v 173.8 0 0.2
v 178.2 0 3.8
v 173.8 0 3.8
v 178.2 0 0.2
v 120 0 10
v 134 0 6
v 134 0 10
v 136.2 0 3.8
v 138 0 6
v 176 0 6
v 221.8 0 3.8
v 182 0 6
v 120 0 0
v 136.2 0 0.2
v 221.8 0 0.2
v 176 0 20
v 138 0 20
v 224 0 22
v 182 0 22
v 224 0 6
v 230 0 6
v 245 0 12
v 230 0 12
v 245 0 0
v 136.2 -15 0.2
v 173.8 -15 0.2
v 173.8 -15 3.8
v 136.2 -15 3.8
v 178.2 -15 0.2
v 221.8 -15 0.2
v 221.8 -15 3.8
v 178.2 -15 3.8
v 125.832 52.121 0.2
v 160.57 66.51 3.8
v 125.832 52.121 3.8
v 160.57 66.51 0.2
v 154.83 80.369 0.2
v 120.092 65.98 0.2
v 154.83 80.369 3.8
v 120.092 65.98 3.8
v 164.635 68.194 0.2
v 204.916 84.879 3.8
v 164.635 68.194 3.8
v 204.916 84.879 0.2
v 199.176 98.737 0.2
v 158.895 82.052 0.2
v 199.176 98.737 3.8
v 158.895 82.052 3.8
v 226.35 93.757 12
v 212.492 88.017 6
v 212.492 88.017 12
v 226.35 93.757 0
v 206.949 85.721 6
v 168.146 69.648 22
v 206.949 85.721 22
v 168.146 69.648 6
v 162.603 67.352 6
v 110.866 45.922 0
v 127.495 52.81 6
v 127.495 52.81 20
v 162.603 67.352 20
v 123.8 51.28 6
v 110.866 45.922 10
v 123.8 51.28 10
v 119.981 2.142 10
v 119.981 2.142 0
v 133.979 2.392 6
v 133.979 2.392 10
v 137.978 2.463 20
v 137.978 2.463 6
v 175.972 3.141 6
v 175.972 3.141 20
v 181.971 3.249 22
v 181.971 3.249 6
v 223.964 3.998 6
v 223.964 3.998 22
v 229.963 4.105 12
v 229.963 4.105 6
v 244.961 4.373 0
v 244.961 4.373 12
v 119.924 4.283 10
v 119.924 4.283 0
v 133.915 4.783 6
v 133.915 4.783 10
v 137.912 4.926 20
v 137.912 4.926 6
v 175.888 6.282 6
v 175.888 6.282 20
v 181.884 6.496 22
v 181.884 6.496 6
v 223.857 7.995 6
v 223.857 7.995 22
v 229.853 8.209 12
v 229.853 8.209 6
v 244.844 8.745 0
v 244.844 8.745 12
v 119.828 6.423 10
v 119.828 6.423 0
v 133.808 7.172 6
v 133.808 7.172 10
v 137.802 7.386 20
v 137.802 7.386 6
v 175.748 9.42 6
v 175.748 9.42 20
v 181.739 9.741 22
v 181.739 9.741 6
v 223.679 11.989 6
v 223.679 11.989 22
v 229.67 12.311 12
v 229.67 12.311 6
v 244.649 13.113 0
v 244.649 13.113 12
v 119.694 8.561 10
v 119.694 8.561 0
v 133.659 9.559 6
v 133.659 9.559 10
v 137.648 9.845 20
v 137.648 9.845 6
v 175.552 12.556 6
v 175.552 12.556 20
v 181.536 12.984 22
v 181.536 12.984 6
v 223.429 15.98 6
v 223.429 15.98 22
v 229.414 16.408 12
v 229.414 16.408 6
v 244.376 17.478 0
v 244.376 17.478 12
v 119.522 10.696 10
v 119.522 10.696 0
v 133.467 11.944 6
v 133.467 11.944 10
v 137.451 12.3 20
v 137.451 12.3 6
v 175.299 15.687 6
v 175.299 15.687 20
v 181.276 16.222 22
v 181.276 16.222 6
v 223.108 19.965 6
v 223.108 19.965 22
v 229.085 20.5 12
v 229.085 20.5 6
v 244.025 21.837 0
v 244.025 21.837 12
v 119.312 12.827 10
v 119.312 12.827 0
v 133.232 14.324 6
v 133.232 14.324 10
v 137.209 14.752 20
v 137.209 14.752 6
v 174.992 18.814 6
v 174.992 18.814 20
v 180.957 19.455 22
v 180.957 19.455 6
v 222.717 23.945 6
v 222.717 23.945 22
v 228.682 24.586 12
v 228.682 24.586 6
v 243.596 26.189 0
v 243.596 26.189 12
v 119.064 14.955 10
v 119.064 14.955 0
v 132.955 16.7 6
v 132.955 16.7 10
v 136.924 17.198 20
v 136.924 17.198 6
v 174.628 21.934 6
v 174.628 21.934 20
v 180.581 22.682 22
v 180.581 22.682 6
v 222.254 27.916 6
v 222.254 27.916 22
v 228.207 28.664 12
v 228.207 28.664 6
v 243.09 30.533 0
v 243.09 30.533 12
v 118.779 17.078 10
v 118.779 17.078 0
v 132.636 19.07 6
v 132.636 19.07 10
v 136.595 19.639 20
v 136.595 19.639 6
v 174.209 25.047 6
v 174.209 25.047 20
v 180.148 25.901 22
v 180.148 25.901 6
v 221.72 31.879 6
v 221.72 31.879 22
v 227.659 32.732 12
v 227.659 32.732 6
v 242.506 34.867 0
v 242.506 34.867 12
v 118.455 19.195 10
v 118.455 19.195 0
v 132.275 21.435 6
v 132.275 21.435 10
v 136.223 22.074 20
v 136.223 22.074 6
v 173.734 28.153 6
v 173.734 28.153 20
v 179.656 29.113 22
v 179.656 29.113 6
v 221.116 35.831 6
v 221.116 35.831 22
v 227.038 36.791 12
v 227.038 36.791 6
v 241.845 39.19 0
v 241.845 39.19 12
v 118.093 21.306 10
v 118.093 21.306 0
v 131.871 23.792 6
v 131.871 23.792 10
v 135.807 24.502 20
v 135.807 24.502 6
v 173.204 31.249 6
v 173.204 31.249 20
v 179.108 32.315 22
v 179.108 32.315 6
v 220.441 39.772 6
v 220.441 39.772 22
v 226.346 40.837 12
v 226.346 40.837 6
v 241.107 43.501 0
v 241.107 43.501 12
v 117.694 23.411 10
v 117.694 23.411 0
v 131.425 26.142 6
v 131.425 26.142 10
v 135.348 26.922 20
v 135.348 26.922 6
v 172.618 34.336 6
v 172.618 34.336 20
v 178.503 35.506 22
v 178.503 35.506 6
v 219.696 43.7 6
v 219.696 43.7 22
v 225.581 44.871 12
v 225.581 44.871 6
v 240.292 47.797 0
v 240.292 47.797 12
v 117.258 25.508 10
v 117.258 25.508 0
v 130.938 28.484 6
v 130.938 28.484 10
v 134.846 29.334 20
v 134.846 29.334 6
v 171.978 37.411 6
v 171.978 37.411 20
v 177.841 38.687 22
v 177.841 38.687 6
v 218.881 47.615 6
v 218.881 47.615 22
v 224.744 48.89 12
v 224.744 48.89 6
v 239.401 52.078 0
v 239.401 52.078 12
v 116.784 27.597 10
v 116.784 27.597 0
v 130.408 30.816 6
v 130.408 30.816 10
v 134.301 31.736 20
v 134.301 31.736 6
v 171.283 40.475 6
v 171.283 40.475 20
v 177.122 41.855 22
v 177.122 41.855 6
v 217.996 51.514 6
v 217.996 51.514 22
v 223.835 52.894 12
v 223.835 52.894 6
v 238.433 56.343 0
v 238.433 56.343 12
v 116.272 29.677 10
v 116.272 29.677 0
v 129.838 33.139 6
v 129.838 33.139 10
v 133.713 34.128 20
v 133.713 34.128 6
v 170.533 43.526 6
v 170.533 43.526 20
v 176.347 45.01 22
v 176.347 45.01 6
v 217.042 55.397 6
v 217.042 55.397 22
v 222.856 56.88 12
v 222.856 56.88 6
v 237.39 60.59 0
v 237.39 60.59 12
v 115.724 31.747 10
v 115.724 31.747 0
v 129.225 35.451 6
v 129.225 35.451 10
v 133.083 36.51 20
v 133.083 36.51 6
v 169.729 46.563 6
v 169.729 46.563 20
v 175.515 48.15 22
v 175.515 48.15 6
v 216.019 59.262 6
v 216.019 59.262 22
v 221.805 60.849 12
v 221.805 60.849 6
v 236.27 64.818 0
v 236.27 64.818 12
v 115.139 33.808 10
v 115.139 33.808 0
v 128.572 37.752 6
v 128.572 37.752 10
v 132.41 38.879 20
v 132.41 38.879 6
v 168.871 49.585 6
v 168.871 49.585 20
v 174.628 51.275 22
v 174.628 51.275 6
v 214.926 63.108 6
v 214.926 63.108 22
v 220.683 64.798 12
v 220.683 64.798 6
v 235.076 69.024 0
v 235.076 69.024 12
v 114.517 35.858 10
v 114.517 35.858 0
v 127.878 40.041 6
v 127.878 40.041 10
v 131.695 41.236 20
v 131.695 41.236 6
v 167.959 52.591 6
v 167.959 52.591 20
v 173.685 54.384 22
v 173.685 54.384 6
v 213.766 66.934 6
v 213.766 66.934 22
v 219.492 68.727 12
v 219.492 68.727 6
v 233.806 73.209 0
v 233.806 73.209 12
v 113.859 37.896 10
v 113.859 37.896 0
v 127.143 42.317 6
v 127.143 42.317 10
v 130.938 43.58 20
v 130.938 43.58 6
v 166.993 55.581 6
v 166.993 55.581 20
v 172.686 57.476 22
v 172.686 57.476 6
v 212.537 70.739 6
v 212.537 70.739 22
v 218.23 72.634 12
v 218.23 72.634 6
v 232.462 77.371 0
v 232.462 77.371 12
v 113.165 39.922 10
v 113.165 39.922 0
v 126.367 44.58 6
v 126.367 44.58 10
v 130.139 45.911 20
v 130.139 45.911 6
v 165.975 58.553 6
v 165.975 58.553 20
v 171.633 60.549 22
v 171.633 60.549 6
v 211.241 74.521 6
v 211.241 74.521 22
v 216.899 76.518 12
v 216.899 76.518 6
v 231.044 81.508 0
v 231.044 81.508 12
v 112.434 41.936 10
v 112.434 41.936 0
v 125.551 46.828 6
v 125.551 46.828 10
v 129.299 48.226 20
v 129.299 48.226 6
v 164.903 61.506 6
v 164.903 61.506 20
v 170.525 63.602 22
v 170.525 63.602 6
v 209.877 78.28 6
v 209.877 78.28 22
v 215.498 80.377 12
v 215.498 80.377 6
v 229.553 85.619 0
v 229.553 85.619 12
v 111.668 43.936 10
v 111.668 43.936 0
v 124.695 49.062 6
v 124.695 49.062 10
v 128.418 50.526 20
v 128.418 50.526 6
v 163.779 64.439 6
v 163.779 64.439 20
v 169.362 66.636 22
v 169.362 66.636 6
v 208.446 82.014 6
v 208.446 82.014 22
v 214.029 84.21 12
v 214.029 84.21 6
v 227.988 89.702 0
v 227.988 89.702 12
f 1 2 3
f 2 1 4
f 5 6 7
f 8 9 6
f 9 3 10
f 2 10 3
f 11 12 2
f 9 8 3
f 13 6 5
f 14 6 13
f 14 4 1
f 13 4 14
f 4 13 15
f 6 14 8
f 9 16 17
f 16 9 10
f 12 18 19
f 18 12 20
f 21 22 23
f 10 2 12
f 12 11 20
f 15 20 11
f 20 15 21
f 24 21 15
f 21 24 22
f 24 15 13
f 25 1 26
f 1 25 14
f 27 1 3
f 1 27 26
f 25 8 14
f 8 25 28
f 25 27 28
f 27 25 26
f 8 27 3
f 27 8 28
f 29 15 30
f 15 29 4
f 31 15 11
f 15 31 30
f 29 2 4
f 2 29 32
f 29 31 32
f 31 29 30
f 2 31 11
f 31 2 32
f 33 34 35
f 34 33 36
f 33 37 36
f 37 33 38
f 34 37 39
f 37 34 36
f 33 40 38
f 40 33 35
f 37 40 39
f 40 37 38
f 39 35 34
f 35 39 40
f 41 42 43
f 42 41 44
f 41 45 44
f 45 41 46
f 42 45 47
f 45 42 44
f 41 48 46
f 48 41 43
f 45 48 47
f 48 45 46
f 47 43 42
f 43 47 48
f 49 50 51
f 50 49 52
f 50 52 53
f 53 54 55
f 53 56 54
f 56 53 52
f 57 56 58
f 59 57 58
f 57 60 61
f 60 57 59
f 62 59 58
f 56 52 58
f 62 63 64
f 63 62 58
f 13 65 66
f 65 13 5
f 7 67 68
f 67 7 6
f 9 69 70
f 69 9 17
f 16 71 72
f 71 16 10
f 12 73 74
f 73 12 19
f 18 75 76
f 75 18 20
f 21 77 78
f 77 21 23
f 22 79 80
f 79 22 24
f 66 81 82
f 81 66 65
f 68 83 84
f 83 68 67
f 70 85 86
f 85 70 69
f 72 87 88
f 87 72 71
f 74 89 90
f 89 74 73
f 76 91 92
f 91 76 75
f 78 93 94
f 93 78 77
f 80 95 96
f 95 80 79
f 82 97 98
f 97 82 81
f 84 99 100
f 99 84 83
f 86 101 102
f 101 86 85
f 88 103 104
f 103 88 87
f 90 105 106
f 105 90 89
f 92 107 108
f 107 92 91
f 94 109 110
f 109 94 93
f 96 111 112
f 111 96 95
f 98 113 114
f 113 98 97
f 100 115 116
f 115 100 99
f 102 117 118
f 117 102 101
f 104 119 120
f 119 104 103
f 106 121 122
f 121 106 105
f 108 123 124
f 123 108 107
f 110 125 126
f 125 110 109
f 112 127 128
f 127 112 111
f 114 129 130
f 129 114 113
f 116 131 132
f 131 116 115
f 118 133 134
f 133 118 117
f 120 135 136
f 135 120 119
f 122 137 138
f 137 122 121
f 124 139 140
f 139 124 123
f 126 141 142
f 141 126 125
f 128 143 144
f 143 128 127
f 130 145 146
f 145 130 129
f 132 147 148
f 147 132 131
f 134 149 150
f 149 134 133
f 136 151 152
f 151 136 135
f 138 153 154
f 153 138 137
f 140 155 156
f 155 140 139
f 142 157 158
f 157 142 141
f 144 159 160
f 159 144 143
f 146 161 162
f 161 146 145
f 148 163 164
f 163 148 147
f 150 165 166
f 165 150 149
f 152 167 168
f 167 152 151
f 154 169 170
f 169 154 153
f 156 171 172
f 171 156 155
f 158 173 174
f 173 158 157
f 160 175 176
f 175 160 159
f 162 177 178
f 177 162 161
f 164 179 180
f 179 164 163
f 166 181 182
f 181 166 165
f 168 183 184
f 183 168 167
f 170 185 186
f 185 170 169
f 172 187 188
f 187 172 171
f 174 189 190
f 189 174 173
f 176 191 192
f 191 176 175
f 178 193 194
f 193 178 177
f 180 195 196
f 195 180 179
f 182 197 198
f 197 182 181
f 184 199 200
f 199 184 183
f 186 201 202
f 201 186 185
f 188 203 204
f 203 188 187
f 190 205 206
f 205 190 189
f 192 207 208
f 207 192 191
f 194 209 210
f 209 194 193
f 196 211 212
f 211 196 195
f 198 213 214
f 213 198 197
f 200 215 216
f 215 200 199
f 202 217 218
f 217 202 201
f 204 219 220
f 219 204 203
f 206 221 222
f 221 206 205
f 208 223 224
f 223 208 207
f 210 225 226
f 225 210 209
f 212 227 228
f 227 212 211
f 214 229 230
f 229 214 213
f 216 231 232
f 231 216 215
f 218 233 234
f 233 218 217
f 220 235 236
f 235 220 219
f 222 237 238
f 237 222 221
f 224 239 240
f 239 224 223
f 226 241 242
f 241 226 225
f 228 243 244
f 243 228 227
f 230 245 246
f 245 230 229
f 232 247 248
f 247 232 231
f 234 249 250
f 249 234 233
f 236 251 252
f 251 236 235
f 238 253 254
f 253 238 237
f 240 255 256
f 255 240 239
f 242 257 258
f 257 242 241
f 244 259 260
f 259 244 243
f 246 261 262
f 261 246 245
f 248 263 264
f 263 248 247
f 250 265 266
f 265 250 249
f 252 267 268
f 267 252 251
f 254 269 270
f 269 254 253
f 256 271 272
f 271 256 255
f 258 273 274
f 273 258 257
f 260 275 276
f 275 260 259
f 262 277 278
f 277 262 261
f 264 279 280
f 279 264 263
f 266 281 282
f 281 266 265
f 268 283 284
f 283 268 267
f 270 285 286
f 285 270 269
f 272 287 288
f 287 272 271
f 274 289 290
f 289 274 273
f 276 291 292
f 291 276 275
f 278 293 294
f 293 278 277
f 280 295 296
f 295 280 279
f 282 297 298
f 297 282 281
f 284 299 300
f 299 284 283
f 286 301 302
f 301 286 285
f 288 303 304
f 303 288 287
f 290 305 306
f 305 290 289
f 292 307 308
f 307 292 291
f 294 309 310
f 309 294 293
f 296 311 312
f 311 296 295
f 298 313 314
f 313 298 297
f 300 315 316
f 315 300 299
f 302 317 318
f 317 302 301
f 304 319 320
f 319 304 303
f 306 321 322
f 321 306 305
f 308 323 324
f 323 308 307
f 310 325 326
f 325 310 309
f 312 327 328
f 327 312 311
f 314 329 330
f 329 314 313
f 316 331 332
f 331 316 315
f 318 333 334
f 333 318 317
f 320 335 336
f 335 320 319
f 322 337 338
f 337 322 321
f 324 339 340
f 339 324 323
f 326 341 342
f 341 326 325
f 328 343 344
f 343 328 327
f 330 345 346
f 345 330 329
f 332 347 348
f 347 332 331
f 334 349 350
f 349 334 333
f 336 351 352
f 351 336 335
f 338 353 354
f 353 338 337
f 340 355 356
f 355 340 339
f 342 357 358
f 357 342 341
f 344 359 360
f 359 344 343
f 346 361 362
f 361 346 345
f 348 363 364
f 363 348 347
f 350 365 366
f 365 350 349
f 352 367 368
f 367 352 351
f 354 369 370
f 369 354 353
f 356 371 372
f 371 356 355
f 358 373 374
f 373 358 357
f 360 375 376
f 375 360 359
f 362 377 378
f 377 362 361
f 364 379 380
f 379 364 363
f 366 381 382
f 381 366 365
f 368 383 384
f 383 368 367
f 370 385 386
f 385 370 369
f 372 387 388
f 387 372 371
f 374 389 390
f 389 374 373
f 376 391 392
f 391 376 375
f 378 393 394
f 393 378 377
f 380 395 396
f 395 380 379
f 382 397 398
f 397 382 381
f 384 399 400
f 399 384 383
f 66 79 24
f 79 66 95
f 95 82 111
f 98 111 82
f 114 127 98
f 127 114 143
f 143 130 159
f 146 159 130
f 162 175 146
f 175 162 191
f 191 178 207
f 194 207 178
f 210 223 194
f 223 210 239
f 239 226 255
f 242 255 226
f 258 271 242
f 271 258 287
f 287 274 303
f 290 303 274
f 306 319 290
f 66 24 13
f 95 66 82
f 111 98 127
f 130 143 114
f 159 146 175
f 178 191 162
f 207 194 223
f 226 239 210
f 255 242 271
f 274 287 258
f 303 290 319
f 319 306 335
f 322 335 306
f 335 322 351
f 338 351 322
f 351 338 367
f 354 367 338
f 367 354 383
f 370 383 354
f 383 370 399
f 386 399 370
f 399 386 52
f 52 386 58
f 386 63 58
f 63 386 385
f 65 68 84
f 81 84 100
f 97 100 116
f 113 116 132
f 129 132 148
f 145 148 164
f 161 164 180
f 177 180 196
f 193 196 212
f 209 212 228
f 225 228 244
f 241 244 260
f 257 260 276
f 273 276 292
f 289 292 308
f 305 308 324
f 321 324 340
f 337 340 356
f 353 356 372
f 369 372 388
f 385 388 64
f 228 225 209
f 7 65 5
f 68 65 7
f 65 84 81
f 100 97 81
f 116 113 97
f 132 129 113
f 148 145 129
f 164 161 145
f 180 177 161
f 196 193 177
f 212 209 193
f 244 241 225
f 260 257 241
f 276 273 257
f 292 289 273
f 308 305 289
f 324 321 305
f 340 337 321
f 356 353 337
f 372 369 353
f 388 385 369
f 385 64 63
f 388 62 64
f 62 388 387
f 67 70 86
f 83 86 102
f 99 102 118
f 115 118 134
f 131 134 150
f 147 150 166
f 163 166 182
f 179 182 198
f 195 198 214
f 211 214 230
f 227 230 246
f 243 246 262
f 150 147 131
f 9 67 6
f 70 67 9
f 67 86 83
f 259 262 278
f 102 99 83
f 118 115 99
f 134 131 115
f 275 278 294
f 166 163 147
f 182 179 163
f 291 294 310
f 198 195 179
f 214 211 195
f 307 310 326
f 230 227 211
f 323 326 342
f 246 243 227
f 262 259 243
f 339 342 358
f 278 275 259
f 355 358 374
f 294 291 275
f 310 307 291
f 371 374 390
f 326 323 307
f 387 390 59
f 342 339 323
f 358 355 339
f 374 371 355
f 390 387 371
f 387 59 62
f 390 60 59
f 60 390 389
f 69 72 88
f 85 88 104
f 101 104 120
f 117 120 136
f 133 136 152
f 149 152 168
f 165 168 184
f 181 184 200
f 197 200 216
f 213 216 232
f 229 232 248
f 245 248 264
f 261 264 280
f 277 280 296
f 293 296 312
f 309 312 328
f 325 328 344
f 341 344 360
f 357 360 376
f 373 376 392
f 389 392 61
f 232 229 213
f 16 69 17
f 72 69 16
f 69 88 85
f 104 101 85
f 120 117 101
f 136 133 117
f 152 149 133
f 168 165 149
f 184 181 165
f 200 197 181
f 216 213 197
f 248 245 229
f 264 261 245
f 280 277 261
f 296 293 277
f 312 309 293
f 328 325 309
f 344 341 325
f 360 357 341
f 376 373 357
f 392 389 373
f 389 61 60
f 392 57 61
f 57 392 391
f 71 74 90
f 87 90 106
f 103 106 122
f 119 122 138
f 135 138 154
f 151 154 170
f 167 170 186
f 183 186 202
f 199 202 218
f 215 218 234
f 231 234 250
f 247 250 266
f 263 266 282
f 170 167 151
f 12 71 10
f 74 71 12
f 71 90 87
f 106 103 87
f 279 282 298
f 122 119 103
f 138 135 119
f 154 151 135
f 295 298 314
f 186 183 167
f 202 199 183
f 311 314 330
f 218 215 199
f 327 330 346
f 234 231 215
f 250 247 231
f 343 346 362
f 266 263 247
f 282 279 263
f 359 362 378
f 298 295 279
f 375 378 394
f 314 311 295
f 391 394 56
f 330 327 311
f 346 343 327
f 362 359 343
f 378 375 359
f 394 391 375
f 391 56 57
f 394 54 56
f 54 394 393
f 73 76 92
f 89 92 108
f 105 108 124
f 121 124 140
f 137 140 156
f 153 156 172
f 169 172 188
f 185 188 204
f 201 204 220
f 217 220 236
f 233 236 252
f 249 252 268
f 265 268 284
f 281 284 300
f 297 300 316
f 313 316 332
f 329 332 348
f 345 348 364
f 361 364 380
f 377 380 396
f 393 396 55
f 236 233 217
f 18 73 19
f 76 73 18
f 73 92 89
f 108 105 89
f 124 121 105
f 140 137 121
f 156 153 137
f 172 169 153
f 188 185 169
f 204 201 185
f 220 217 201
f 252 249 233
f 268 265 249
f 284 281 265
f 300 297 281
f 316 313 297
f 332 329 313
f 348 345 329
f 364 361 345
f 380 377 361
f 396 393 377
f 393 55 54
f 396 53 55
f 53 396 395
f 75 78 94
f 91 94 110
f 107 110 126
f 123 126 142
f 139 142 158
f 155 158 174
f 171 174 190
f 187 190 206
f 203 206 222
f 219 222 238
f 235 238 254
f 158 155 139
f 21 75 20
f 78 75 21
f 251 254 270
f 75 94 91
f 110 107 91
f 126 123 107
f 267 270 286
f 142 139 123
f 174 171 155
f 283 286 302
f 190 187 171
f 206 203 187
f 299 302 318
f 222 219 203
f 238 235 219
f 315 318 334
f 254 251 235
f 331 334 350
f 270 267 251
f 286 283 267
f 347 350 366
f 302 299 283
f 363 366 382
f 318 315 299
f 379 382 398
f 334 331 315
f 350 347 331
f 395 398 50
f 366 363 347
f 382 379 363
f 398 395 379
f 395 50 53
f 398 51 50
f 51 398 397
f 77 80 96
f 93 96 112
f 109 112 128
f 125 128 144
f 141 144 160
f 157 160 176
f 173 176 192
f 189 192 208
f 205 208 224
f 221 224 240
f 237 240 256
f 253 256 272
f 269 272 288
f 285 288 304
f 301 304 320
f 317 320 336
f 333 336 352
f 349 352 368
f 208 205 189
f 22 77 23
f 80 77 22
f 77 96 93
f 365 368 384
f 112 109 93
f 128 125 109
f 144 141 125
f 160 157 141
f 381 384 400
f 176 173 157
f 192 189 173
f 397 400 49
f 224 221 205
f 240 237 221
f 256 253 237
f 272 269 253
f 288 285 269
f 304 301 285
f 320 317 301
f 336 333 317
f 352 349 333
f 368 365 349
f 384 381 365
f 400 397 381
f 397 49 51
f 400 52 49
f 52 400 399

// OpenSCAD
// ============================================================
//  PVC PERDE RAYI DÖNÜŞ PARÇASI - parametrik model
//  Açı: 45 / 22.5 / 11.25 (veya istediğiniz değer)
//  Kullanım: aşağıdaki ölçüleri gerçek parçadan alıp değiştirin,
//  F6 ile render edip "Export as STL" yapın.
//  Komut satırı: openscad -D aci=22.5 -o donus_22_5.stl perde_donus.scad
// ============================================================

aci        = 22.5;   // dönüş açısı (derece)
R_ic       = 120;    // en içteki kenarın yay yarıçapı (mm)  <-- ÖLÇÜN
$fn        = 360;

// ---- Ray kesit profili (straight rayın ucundan bakınca görünen şekil) ----
// Her nokta: [içten dışa mesafe (mm), yükseklik (mm)]
// Rayın ucunu milimetrik kâğıda bastırıp çizerek bu noktaları çıkarın.
// Aşağıdaki değerler fotoğraftan tahmini, GERÇEK DEĞİL:
profil = [
  [0,   0], [125, 0],           // taban
  [125, 12], [110, 12],         // dış (üst) dudak
  [110, 6],  [104, 6],          // kanal
  [104, 22], [62, 22],          // orta geniş bant (yuvarlak düğmeli)
  [62, 6],   [56, 6],           // kanal
  [56, 20],  [18, 20],          // alt geniş bant
  [18, 6],   [14, 6],           // kanal
  [14, 10],  [0, 10]            // iç (alt) dudak
];

// ---- Uç geçme dilleri (düz rayın içine giren tırnak) ----
dil_var      = true;
dil_boy      = 15;   // raya ne kadar girdiği (mm)       <-- ÖLÇÜN
dil_kalinlik = 2;    // dil et kalınlığı (mm)            <-- ÖLÇÜN
dil_bosluk   = 0.2;  // baskı toleransı (mm), sıkıysa artırın
// Dil, kesitin içine oturan küçültülmüş bir profil şeridi olarak üretilir
dil_profil = [
  [16, 0], [54, 0], [54, 4], [16, 4]   // alt bant altındaki dil
];
dil_profil2 = [
  [58, 0], [102, 0], [102, 4], [58, 4] // orta bant altındaki dil
];

// ---------------- MODEL ----------------
module kesit(p) translate([R_ic,0]) polygon(p);

module govde() rotate_extrude(angle=aci) kesit(profil);

module dil(p) {
  // düz (teğet) doğrultuda uzanan geçme dili
  rotate([90,0,0]) linear_extrude(dil_boy)
    offset(delta=-dil_bosluk) kesit(p);
}

govde();
if (dil_var) {
  // başlangıç ucu (0°)
  for (p=[dil_profil, dil_profil2]) dil(p);
  // bitiş ucu (aci°)
  rotate([0,0,aci]) mirror([0,1,0]) for (p=[dil_profil, dil_profil2]) dil(p);
}
